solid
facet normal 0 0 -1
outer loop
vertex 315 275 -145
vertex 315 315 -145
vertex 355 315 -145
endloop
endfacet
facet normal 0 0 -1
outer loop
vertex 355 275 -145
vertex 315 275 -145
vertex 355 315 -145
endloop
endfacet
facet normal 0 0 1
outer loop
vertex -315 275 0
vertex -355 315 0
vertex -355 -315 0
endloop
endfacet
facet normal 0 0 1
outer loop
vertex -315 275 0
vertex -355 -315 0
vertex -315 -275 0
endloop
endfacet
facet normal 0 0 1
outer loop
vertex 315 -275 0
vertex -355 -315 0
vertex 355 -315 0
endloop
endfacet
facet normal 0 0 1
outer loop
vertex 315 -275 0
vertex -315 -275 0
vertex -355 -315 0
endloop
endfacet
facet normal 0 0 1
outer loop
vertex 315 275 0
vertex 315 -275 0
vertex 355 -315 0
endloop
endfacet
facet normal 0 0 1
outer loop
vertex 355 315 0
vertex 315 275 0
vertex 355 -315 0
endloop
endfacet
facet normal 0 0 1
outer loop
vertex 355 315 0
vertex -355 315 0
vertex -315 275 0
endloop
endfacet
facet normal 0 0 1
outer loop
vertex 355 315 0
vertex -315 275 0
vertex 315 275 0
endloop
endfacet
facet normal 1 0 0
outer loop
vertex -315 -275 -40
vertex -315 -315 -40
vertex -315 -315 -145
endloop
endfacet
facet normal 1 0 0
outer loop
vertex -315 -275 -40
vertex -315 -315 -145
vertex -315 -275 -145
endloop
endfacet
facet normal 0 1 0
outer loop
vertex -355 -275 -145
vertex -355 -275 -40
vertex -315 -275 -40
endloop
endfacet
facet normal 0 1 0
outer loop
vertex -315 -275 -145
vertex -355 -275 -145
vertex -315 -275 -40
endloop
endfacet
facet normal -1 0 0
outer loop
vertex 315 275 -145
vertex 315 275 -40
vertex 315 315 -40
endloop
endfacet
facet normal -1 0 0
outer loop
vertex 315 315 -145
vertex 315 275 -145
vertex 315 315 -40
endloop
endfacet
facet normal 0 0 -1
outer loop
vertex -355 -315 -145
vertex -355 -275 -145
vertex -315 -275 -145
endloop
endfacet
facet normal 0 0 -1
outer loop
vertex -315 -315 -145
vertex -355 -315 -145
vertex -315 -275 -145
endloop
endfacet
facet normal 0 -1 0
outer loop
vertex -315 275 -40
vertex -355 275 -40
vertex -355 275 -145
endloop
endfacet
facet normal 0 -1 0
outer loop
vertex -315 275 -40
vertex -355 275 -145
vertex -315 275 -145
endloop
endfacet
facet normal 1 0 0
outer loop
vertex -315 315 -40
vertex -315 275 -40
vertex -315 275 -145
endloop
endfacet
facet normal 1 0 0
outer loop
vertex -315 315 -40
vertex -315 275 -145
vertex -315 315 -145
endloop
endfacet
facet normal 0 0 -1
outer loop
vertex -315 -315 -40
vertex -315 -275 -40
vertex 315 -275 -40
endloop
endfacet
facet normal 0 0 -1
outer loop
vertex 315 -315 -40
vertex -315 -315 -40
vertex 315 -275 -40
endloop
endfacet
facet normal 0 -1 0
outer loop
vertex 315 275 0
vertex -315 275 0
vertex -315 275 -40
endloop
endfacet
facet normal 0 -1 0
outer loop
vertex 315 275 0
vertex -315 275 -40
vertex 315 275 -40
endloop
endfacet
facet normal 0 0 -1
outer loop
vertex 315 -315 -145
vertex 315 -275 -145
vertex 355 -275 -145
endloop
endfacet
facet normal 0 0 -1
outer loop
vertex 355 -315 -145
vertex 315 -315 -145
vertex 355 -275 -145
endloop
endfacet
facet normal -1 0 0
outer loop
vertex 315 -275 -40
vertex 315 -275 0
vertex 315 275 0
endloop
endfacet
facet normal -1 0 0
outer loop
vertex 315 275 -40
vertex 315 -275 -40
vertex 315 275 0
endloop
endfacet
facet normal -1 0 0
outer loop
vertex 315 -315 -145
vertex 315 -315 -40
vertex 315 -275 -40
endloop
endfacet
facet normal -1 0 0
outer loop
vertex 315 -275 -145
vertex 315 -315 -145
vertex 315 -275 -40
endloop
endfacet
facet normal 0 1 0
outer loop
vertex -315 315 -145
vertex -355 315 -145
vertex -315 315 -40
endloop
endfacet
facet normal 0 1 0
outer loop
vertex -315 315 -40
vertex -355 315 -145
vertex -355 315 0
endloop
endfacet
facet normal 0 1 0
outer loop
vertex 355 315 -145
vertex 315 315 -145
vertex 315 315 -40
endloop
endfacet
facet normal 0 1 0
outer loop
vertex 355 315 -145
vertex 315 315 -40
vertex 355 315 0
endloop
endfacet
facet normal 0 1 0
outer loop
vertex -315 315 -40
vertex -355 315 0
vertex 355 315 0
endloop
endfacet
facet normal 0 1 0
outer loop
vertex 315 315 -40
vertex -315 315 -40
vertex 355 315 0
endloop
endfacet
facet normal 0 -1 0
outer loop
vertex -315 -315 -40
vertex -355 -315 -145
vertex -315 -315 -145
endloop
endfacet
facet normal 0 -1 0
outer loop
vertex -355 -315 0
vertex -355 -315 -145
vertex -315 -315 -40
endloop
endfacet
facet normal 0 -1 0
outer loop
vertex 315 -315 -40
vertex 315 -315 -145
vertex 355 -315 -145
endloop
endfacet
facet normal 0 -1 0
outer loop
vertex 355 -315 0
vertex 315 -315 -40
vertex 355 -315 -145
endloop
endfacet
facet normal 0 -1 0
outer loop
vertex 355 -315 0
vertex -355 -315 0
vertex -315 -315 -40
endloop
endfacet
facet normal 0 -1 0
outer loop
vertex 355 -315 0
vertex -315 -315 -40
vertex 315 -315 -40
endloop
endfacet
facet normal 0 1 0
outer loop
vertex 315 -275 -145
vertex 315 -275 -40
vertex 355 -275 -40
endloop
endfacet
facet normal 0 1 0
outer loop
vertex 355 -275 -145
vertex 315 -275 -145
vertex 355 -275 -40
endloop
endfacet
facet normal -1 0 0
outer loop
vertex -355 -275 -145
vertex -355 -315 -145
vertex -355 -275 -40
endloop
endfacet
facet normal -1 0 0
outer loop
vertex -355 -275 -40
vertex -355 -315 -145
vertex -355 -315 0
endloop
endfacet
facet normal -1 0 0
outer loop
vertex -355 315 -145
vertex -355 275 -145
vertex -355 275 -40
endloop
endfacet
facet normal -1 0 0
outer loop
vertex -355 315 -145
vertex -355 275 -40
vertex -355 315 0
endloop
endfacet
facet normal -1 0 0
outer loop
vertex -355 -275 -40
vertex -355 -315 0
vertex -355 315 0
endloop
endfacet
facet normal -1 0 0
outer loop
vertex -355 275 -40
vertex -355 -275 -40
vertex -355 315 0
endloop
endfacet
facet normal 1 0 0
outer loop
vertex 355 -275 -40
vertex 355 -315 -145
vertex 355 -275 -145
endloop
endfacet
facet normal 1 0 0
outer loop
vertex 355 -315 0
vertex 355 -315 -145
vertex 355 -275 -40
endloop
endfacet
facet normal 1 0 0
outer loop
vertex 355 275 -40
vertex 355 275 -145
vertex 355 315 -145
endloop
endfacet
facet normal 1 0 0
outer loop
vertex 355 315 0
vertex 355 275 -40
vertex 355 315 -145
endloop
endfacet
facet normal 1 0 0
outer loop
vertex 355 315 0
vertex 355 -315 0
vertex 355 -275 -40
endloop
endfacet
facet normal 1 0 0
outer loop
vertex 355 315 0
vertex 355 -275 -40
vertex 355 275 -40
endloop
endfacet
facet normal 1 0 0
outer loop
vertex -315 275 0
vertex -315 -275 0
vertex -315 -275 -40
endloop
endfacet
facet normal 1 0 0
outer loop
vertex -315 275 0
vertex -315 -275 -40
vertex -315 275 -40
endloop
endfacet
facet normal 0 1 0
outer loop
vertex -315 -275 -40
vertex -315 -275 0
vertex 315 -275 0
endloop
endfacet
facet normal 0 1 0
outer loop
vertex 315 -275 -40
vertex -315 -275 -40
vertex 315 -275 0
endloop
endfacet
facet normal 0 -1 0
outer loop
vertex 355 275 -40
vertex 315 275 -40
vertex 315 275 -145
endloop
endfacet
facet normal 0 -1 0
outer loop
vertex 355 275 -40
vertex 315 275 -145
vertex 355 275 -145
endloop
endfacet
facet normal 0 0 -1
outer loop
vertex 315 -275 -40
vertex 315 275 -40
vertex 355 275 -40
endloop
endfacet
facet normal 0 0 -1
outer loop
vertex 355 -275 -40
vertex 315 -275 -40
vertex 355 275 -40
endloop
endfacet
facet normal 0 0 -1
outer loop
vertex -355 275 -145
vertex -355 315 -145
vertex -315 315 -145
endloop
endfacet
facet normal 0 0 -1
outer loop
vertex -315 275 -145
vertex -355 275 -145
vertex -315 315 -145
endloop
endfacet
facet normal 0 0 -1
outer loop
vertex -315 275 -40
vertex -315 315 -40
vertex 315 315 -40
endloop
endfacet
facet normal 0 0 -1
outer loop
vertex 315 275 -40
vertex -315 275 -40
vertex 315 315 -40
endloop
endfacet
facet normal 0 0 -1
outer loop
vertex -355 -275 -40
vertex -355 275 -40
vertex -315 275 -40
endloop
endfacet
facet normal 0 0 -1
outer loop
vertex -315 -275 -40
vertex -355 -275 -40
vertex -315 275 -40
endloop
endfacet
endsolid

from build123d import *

# Parameters (mm, degrees)
F0_W     = 40
F0_H     = 40
F1_DEPTH = 145
F0_W_2   = 630
F0_H_2   = 550
F2_DEPTH = 40


with BuildPart() as f1:
    # F0 (on Top) → F1 (new body)
    with BuildSketch(Plane.XY):
        with Locations((-335, 295)):
            Rectangle(F0_W, F0_H)
    extrude(amount=-F1_DEPTH)



with BuildPart() as f1b:
    # F0 (on Top) → F1, piece 2 (new body)
    with BuildSketch(Plane.XY):
        with Locations((335, 295)):
            Rectangle(F0_W, F0_H)
    extrude(amount=-F1_DEPTH)


with BuildPart() as f1c:
    # F0 (on Top) → F1, piece 3 (new body)
    with BuildSketch(Plane.XY):
        with Locations((335, -295)):
            Rectangle(F0_W, F0_H)
    extrude(amount=-F1_DEPTH)


with BuildPart() as f1d:
    # F0 (on Top) → F1, piece 4 (new body)
    with BuildSketch(Plane.XY):
        with Locations((-335, -295)):
            Rectangle(F0_W, F0_H)
    extrude(amount=-F1_DEPTH)


with BuildPart() as f1_1:
    add(f1.part)

    add(f1b.part)  # F2 merges F1b

    add(f1c.part)  # F2 merges F1c

    add(f1d.part)  # F2 merges F1d
    # F0 (on Top) → F2 (join)
    with BuildSketch(Plane.XY):
        with Locations((0, -295)):
            Rectangle(F0_W_2, F0_H)
        with Locations((335, 0)):
            Rectangle(F0_W, F0_H_2)
        with Locations((0, 295)):
            Rectangle(F0_W_2, F0_H)
        with Locations((-335, 0)):
            Rectangle(F0_W, F0_H_2)
    extrude(amount=-F2_DEPTH)


solid = f1_1.part
